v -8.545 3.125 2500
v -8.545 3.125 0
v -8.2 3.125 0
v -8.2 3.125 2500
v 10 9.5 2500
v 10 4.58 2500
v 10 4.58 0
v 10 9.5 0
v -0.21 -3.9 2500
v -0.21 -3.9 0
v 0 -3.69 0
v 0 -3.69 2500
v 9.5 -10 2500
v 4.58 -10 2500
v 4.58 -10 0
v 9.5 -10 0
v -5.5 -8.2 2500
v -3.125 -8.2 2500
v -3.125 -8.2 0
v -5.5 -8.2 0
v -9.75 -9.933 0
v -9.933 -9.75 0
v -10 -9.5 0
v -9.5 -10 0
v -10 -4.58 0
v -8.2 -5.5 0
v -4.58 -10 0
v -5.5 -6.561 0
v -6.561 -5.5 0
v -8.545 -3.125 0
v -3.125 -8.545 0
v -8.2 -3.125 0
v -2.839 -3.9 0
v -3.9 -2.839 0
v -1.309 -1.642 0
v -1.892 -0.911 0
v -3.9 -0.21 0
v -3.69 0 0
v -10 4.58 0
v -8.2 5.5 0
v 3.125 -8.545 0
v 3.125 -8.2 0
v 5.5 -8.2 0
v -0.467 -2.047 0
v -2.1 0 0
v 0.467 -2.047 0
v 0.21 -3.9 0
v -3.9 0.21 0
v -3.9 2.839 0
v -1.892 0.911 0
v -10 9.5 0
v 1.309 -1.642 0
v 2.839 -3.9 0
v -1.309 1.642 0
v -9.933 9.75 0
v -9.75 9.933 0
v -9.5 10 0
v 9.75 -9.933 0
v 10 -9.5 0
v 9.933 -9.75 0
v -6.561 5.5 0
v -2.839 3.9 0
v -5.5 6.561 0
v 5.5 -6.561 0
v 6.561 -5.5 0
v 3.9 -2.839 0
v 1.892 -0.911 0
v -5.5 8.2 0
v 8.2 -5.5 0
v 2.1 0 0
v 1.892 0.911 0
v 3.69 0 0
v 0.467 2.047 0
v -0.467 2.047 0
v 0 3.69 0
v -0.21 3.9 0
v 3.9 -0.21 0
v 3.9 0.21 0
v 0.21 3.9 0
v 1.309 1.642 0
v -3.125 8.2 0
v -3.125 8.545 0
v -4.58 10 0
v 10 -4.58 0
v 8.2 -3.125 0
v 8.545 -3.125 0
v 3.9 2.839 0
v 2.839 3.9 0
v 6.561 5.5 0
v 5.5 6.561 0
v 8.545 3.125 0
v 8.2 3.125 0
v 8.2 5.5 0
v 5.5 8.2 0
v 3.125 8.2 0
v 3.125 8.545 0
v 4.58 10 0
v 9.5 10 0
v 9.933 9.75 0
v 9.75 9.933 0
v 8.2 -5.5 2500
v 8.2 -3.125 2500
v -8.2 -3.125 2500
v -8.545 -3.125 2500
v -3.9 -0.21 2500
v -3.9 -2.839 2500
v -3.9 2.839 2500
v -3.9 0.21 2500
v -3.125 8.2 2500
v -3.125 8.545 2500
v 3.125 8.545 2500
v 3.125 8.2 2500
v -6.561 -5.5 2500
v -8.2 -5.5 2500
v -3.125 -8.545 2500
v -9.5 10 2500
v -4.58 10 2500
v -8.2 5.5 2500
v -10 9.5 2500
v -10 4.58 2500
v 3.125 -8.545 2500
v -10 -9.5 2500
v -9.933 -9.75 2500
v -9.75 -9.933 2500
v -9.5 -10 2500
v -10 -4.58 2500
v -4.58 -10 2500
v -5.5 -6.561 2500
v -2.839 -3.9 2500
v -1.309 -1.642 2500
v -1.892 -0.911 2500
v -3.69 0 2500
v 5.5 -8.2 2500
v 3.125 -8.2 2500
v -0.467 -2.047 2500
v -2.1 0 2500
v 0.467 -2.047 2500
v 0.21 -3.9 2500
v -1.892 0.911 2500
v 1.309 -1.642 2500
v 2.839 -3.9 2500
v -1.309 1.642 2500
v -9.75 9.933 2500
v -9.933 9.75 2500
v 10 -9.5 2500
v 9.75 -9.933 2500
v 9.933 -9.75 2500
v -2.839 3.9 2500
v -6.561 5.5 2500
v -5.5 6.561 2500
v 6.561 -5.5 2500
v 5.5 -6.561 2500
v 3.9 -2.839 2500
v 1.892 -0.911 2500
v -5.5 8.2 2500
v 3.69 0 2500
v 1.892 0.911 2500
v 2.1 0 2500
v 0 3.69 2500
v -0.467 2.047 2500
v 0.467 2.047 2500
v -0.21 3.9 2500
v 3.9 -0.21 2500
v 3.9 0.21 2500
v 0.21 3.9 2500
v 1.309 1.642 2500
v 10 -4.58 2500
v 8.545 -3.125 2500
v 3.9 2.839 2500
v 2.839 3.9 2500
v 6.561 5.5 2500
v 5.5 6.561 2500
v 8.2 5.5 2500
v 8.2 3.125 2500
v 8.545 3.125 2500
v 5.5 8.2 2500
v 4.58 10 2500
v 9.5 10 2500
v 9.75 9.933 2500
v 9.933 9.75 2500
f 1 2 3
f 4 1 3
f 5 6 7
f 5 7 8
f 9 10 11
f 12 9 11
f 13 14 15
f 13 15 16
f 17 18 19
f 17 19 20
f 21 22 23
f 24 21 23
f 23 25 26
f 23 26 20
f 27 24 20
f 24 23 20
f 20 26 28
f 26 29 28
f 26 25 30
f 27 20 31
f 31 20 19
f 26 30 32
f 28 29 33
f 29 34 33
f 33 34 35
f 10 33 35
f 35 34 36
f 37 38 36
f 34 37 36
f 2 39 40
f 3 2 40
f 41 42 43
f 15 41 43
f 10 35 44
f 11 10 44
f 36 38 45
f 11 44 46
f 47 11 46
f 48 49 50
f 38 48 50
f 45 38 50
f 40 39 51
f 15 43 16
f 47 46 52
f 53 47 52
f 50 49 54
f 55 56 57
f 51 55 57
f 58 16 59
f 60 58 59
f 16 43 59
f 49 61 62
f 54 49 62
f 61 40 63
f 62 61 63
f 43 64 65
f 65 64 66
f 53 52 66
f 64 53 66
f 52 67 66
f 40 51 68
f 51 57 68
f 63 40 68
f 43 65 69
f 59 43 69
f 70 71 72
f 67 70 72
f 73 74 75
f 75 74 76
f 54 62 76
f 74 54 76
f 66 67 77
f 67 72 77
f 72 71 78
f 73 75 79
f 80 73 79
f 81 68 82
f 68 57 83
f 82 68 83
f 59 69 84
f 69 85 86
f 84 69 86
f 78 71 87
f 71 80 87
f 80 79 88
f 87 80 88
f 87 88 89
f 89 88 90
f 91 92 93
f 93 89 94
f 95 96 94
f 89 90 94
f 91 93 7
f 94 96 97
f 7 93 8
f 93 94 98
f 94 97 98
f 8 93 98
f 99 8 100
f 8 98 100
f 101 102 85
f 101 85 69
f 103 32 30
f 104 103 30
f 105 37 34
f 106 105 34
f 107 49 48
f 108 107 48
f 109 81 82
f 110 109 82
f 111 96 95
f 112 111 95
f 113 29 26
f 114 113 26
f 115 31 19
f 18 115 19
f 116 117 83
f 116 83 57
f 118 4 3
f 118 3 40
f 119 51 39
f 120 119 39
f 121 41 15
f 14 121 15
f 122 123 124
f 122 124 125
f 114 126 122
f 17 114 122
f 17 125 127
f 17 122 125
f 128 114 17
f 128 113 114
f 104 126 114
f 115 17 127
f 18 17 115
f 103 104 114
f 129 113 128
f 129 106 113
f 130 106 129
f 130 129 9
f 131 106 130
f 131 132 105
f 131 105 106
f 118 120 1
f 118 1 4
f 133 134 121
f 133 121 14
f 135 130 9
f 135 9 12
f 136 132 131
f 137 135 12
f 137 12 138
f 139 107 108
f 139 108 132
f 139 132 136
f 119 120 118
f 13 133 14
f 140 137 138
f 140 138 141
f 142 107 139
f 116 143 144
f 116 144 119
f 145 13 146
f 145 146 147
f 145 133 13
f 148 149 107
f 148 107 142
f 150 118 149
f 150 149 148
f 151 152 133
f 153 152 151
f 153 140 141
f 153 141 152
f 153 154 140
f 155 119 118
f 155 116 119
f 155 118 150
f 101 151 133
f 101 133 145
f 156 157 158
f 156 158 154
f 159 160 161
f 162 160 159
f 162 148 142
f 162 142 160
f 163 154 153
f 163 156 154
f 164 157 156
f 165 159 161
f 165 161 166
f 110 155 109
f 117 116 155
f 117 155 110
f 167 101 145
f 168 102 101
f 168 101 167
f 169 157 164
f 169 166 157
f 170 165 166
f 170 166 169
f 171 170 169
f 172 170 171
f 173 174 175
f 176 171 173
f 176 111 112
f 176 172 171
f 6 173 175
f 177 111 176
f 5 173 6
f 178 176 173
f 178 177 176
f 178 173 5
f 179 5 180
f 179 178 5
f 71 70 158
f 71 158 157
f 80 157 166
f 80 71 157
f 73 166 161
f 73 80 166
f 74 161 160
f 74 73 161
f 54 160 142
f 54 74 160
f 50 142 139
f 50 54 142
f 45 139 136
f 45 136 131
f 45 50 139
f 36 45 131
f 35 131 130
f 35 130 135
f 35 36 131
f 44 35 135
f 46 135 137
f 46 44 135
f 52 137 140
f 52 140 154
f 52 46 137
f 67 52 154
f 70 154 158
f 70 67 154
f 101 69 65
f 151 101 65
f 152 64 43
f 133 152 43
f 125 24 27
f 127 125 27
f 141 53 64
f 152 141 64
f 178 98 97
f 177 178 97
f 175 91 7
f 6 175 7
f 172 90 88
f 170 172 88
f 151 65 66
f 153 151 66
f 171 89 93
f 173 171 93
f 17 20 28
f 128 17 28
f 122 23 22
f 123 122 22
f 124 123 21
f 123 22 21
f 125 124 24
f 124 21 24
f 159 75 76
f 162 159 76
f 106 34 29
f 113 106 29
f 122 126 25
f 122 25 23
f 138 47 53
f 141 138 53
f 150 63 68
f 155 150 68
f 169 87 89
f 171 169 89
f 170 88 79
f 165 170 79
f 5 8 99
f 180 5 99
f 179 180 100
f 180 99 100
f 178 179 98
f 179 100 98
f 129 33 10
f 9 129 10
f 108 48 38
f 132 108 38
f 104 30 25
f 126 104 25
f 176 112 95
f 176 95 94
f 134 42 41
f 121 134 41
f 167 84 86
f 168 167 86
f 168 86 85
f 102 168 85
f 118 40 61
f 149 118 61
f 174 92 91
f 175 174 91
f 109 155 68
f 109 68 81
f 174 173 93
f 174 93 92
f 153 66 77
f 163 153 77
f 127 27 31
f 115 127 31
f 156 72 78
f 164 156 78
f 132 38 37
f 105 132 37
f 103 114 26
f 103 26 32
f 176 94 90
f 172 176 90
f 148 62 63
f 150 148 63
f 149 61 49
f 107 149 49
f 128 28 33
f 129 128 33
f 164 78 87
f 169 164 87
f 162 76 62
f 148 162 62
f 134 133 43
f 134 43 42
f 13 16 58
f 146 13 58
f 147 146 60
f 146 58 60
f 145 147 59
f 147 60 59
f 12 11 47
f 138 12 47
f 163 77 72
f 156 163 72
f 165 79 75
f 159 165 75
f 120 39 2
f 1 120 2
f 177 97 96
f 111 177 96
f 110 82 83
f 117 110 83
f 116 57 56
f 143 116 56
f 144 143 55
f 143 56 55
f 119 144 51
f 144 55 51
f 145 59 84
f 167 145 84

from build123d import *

# Parameters (mm, degrees)
SKETCH1_R           = 2.1
BOSS_EXTRUDE1_DEPTH = 2500


with BuildPart() as part:
    # Sketch1 → Boss-Extrude1 (new body)
    with BuildSketch(Plane.XY):
        with BuildLine():
            Line((4.58, -10), (9.5, -10))
            ThreePointArc((9.5, -10), (9.853553391, -9.853553391), (10, -9.5))
            Line((10, -9.5), (10, -4.58))
            Line((10, -4.58), (8.545, -3.125))
            Line((8.545, -3.125), (8.2, -3.125))
            Line((8.2, -3.125), (8.2, -5.5))
            Line((8.2, -5.5), (6.560660172, -5.5))
            Line((6.560660172, -5.5), (3.9, -2.839339828))
            Line((3.9, -2.839339828), (3.9, -0.21))
            Line((3.9, -0.21), (3.69, 0))
            Line((3.69, 0), (3.9, 0.21))
            Line((3.9, 0.21), (3.9, 2.839339828))
            Line((3.9, 2.839339828), (6.560660172, 5.5))
            Line((6.560660172, 5.5), (8.2, 5.5))
            Line((8.2, 5.5), (8.2, 3.125))
            Line((8.2, 3.125), (8.545, 3.125))
            Line((8.545, 3.125), (10, 4.58))
            Line((10, 4.58), (10, 9.5))
            ThreePointArc((10, 9.5), (9.853553391, 9.853553391), (9.5, 10))
            Line((9.5, 10), (4.58, 10))
            Line((4.58, 10), (3.125, 8.545))
            Line((3.125, 8.545), (3.125, 8.2))
            Line((3.125, 8.2), (5.5, 8.2))
            Line((5.5, 8.2), (5.5, 6.560660172))
            Line((5.5, 6.560660172), (2.839339828, 3.9))
            Line((2.839339828, 3.9), (0.21, 3.9))
            Line((0.21, 3.9), (0, 3.69))
            Line((0, 3.69), (-0.21, 3.9))
            Line((-0.21, 3.9), (-2.839339828, 3.9))
            Line((-2.839339828, 3.9), (-5.5, 6.560660172))
            Line((-5.5, 6.560660172), (-5.5, 8.2))
            Line((-5.5, 8.2), (-3.125, 8.2))
            Line((-3.125, 8.2), (-3.125, 8.545))
            Line((-3.125, 8.545), (-4.58, 10))
            Line((-4.58, 10), (-9.5, 10))
            ThreePointArc((-9.5, 10), (-9.853553391, 9.853553391), (-10, 9.5))
            Line((-10, 9.5), (-10, 4.58))
            Line((-10, 4.58), (-8.545, 3.125))
            Line((-8.545, 3.125), (-8.2, 3.125))
            Line((-8.2, 3.125), (-8.2, 5.5))
            Line((-8.2, 5.5), (-6.560660172, 5.5))
            Line((-6.560660172, 5.5), (-3.9, 2.839339828))
            Line((-3.9, 2.839339828), (-3.9, 0.21))
            Line((-3.9, 0.21), (-3.69, 0))
            Line((-3.69, 0), (-3.9, -0.21))
            Line((-3.9, -0.21), (-3.9, -2.839339828))
            Line((-3.9, -2.839339828), (-6.560660172, -5.5))
            Line((-6.560660172, -5.5), (-8.2, -5.5))
            Line((-8.2, -5.5), (-8.2, -3.125))
            Line((-8.2, -3.125), (-8.545, -3.125))
            Line((-8.545, -3.125), (-10, -4.58))
            Line((-10, -4.58), (-10, -9.5))
            ThreePointArc((-10, -9.5), (-9.853553391, -9.853553391), (-9.5, -10))
            Line((-9.5, -10), (-4.58, -10))
            Line((-4.58, -10), (-3.125, -8.545))
            Line((-3.125, -8.545), (-3.125, -8.2))
            Line((-3.125, -8.2), (-5.5, -8.2))
            Line((-5.5, -8.2), (-5.5, -6.560660172))
            Line((-5.5, -6.560660172), (-2.839339828, -3.9))
            Line((-2.839339828, -3.9), (-0.21, -3.9))
            Line((-0.21, -3.9), (0, -3.69))
            Line((0, -3.69), (0.21, -3.9))
            Line((0.21, -3.9), (2.839339828, -3.9))
            Line((2.839339828, -3.9), (5.5, -6.560660172))
            Line((5.5, -6.560660172), (5.5, -8.2))
            Line((5.5, -8.2), (3.125, -8.2))
            Line((3.125, -8.2), (3.125, -8.545))
            Line((3.125, -8.545), (4.58, -10))
        make_face()
        Circle(SKETCH1_R, mode=Mode.SUBTRACT)
    extrude(amount=BOSS_EXTRUDE1_DEPTH)


solid = part.part
